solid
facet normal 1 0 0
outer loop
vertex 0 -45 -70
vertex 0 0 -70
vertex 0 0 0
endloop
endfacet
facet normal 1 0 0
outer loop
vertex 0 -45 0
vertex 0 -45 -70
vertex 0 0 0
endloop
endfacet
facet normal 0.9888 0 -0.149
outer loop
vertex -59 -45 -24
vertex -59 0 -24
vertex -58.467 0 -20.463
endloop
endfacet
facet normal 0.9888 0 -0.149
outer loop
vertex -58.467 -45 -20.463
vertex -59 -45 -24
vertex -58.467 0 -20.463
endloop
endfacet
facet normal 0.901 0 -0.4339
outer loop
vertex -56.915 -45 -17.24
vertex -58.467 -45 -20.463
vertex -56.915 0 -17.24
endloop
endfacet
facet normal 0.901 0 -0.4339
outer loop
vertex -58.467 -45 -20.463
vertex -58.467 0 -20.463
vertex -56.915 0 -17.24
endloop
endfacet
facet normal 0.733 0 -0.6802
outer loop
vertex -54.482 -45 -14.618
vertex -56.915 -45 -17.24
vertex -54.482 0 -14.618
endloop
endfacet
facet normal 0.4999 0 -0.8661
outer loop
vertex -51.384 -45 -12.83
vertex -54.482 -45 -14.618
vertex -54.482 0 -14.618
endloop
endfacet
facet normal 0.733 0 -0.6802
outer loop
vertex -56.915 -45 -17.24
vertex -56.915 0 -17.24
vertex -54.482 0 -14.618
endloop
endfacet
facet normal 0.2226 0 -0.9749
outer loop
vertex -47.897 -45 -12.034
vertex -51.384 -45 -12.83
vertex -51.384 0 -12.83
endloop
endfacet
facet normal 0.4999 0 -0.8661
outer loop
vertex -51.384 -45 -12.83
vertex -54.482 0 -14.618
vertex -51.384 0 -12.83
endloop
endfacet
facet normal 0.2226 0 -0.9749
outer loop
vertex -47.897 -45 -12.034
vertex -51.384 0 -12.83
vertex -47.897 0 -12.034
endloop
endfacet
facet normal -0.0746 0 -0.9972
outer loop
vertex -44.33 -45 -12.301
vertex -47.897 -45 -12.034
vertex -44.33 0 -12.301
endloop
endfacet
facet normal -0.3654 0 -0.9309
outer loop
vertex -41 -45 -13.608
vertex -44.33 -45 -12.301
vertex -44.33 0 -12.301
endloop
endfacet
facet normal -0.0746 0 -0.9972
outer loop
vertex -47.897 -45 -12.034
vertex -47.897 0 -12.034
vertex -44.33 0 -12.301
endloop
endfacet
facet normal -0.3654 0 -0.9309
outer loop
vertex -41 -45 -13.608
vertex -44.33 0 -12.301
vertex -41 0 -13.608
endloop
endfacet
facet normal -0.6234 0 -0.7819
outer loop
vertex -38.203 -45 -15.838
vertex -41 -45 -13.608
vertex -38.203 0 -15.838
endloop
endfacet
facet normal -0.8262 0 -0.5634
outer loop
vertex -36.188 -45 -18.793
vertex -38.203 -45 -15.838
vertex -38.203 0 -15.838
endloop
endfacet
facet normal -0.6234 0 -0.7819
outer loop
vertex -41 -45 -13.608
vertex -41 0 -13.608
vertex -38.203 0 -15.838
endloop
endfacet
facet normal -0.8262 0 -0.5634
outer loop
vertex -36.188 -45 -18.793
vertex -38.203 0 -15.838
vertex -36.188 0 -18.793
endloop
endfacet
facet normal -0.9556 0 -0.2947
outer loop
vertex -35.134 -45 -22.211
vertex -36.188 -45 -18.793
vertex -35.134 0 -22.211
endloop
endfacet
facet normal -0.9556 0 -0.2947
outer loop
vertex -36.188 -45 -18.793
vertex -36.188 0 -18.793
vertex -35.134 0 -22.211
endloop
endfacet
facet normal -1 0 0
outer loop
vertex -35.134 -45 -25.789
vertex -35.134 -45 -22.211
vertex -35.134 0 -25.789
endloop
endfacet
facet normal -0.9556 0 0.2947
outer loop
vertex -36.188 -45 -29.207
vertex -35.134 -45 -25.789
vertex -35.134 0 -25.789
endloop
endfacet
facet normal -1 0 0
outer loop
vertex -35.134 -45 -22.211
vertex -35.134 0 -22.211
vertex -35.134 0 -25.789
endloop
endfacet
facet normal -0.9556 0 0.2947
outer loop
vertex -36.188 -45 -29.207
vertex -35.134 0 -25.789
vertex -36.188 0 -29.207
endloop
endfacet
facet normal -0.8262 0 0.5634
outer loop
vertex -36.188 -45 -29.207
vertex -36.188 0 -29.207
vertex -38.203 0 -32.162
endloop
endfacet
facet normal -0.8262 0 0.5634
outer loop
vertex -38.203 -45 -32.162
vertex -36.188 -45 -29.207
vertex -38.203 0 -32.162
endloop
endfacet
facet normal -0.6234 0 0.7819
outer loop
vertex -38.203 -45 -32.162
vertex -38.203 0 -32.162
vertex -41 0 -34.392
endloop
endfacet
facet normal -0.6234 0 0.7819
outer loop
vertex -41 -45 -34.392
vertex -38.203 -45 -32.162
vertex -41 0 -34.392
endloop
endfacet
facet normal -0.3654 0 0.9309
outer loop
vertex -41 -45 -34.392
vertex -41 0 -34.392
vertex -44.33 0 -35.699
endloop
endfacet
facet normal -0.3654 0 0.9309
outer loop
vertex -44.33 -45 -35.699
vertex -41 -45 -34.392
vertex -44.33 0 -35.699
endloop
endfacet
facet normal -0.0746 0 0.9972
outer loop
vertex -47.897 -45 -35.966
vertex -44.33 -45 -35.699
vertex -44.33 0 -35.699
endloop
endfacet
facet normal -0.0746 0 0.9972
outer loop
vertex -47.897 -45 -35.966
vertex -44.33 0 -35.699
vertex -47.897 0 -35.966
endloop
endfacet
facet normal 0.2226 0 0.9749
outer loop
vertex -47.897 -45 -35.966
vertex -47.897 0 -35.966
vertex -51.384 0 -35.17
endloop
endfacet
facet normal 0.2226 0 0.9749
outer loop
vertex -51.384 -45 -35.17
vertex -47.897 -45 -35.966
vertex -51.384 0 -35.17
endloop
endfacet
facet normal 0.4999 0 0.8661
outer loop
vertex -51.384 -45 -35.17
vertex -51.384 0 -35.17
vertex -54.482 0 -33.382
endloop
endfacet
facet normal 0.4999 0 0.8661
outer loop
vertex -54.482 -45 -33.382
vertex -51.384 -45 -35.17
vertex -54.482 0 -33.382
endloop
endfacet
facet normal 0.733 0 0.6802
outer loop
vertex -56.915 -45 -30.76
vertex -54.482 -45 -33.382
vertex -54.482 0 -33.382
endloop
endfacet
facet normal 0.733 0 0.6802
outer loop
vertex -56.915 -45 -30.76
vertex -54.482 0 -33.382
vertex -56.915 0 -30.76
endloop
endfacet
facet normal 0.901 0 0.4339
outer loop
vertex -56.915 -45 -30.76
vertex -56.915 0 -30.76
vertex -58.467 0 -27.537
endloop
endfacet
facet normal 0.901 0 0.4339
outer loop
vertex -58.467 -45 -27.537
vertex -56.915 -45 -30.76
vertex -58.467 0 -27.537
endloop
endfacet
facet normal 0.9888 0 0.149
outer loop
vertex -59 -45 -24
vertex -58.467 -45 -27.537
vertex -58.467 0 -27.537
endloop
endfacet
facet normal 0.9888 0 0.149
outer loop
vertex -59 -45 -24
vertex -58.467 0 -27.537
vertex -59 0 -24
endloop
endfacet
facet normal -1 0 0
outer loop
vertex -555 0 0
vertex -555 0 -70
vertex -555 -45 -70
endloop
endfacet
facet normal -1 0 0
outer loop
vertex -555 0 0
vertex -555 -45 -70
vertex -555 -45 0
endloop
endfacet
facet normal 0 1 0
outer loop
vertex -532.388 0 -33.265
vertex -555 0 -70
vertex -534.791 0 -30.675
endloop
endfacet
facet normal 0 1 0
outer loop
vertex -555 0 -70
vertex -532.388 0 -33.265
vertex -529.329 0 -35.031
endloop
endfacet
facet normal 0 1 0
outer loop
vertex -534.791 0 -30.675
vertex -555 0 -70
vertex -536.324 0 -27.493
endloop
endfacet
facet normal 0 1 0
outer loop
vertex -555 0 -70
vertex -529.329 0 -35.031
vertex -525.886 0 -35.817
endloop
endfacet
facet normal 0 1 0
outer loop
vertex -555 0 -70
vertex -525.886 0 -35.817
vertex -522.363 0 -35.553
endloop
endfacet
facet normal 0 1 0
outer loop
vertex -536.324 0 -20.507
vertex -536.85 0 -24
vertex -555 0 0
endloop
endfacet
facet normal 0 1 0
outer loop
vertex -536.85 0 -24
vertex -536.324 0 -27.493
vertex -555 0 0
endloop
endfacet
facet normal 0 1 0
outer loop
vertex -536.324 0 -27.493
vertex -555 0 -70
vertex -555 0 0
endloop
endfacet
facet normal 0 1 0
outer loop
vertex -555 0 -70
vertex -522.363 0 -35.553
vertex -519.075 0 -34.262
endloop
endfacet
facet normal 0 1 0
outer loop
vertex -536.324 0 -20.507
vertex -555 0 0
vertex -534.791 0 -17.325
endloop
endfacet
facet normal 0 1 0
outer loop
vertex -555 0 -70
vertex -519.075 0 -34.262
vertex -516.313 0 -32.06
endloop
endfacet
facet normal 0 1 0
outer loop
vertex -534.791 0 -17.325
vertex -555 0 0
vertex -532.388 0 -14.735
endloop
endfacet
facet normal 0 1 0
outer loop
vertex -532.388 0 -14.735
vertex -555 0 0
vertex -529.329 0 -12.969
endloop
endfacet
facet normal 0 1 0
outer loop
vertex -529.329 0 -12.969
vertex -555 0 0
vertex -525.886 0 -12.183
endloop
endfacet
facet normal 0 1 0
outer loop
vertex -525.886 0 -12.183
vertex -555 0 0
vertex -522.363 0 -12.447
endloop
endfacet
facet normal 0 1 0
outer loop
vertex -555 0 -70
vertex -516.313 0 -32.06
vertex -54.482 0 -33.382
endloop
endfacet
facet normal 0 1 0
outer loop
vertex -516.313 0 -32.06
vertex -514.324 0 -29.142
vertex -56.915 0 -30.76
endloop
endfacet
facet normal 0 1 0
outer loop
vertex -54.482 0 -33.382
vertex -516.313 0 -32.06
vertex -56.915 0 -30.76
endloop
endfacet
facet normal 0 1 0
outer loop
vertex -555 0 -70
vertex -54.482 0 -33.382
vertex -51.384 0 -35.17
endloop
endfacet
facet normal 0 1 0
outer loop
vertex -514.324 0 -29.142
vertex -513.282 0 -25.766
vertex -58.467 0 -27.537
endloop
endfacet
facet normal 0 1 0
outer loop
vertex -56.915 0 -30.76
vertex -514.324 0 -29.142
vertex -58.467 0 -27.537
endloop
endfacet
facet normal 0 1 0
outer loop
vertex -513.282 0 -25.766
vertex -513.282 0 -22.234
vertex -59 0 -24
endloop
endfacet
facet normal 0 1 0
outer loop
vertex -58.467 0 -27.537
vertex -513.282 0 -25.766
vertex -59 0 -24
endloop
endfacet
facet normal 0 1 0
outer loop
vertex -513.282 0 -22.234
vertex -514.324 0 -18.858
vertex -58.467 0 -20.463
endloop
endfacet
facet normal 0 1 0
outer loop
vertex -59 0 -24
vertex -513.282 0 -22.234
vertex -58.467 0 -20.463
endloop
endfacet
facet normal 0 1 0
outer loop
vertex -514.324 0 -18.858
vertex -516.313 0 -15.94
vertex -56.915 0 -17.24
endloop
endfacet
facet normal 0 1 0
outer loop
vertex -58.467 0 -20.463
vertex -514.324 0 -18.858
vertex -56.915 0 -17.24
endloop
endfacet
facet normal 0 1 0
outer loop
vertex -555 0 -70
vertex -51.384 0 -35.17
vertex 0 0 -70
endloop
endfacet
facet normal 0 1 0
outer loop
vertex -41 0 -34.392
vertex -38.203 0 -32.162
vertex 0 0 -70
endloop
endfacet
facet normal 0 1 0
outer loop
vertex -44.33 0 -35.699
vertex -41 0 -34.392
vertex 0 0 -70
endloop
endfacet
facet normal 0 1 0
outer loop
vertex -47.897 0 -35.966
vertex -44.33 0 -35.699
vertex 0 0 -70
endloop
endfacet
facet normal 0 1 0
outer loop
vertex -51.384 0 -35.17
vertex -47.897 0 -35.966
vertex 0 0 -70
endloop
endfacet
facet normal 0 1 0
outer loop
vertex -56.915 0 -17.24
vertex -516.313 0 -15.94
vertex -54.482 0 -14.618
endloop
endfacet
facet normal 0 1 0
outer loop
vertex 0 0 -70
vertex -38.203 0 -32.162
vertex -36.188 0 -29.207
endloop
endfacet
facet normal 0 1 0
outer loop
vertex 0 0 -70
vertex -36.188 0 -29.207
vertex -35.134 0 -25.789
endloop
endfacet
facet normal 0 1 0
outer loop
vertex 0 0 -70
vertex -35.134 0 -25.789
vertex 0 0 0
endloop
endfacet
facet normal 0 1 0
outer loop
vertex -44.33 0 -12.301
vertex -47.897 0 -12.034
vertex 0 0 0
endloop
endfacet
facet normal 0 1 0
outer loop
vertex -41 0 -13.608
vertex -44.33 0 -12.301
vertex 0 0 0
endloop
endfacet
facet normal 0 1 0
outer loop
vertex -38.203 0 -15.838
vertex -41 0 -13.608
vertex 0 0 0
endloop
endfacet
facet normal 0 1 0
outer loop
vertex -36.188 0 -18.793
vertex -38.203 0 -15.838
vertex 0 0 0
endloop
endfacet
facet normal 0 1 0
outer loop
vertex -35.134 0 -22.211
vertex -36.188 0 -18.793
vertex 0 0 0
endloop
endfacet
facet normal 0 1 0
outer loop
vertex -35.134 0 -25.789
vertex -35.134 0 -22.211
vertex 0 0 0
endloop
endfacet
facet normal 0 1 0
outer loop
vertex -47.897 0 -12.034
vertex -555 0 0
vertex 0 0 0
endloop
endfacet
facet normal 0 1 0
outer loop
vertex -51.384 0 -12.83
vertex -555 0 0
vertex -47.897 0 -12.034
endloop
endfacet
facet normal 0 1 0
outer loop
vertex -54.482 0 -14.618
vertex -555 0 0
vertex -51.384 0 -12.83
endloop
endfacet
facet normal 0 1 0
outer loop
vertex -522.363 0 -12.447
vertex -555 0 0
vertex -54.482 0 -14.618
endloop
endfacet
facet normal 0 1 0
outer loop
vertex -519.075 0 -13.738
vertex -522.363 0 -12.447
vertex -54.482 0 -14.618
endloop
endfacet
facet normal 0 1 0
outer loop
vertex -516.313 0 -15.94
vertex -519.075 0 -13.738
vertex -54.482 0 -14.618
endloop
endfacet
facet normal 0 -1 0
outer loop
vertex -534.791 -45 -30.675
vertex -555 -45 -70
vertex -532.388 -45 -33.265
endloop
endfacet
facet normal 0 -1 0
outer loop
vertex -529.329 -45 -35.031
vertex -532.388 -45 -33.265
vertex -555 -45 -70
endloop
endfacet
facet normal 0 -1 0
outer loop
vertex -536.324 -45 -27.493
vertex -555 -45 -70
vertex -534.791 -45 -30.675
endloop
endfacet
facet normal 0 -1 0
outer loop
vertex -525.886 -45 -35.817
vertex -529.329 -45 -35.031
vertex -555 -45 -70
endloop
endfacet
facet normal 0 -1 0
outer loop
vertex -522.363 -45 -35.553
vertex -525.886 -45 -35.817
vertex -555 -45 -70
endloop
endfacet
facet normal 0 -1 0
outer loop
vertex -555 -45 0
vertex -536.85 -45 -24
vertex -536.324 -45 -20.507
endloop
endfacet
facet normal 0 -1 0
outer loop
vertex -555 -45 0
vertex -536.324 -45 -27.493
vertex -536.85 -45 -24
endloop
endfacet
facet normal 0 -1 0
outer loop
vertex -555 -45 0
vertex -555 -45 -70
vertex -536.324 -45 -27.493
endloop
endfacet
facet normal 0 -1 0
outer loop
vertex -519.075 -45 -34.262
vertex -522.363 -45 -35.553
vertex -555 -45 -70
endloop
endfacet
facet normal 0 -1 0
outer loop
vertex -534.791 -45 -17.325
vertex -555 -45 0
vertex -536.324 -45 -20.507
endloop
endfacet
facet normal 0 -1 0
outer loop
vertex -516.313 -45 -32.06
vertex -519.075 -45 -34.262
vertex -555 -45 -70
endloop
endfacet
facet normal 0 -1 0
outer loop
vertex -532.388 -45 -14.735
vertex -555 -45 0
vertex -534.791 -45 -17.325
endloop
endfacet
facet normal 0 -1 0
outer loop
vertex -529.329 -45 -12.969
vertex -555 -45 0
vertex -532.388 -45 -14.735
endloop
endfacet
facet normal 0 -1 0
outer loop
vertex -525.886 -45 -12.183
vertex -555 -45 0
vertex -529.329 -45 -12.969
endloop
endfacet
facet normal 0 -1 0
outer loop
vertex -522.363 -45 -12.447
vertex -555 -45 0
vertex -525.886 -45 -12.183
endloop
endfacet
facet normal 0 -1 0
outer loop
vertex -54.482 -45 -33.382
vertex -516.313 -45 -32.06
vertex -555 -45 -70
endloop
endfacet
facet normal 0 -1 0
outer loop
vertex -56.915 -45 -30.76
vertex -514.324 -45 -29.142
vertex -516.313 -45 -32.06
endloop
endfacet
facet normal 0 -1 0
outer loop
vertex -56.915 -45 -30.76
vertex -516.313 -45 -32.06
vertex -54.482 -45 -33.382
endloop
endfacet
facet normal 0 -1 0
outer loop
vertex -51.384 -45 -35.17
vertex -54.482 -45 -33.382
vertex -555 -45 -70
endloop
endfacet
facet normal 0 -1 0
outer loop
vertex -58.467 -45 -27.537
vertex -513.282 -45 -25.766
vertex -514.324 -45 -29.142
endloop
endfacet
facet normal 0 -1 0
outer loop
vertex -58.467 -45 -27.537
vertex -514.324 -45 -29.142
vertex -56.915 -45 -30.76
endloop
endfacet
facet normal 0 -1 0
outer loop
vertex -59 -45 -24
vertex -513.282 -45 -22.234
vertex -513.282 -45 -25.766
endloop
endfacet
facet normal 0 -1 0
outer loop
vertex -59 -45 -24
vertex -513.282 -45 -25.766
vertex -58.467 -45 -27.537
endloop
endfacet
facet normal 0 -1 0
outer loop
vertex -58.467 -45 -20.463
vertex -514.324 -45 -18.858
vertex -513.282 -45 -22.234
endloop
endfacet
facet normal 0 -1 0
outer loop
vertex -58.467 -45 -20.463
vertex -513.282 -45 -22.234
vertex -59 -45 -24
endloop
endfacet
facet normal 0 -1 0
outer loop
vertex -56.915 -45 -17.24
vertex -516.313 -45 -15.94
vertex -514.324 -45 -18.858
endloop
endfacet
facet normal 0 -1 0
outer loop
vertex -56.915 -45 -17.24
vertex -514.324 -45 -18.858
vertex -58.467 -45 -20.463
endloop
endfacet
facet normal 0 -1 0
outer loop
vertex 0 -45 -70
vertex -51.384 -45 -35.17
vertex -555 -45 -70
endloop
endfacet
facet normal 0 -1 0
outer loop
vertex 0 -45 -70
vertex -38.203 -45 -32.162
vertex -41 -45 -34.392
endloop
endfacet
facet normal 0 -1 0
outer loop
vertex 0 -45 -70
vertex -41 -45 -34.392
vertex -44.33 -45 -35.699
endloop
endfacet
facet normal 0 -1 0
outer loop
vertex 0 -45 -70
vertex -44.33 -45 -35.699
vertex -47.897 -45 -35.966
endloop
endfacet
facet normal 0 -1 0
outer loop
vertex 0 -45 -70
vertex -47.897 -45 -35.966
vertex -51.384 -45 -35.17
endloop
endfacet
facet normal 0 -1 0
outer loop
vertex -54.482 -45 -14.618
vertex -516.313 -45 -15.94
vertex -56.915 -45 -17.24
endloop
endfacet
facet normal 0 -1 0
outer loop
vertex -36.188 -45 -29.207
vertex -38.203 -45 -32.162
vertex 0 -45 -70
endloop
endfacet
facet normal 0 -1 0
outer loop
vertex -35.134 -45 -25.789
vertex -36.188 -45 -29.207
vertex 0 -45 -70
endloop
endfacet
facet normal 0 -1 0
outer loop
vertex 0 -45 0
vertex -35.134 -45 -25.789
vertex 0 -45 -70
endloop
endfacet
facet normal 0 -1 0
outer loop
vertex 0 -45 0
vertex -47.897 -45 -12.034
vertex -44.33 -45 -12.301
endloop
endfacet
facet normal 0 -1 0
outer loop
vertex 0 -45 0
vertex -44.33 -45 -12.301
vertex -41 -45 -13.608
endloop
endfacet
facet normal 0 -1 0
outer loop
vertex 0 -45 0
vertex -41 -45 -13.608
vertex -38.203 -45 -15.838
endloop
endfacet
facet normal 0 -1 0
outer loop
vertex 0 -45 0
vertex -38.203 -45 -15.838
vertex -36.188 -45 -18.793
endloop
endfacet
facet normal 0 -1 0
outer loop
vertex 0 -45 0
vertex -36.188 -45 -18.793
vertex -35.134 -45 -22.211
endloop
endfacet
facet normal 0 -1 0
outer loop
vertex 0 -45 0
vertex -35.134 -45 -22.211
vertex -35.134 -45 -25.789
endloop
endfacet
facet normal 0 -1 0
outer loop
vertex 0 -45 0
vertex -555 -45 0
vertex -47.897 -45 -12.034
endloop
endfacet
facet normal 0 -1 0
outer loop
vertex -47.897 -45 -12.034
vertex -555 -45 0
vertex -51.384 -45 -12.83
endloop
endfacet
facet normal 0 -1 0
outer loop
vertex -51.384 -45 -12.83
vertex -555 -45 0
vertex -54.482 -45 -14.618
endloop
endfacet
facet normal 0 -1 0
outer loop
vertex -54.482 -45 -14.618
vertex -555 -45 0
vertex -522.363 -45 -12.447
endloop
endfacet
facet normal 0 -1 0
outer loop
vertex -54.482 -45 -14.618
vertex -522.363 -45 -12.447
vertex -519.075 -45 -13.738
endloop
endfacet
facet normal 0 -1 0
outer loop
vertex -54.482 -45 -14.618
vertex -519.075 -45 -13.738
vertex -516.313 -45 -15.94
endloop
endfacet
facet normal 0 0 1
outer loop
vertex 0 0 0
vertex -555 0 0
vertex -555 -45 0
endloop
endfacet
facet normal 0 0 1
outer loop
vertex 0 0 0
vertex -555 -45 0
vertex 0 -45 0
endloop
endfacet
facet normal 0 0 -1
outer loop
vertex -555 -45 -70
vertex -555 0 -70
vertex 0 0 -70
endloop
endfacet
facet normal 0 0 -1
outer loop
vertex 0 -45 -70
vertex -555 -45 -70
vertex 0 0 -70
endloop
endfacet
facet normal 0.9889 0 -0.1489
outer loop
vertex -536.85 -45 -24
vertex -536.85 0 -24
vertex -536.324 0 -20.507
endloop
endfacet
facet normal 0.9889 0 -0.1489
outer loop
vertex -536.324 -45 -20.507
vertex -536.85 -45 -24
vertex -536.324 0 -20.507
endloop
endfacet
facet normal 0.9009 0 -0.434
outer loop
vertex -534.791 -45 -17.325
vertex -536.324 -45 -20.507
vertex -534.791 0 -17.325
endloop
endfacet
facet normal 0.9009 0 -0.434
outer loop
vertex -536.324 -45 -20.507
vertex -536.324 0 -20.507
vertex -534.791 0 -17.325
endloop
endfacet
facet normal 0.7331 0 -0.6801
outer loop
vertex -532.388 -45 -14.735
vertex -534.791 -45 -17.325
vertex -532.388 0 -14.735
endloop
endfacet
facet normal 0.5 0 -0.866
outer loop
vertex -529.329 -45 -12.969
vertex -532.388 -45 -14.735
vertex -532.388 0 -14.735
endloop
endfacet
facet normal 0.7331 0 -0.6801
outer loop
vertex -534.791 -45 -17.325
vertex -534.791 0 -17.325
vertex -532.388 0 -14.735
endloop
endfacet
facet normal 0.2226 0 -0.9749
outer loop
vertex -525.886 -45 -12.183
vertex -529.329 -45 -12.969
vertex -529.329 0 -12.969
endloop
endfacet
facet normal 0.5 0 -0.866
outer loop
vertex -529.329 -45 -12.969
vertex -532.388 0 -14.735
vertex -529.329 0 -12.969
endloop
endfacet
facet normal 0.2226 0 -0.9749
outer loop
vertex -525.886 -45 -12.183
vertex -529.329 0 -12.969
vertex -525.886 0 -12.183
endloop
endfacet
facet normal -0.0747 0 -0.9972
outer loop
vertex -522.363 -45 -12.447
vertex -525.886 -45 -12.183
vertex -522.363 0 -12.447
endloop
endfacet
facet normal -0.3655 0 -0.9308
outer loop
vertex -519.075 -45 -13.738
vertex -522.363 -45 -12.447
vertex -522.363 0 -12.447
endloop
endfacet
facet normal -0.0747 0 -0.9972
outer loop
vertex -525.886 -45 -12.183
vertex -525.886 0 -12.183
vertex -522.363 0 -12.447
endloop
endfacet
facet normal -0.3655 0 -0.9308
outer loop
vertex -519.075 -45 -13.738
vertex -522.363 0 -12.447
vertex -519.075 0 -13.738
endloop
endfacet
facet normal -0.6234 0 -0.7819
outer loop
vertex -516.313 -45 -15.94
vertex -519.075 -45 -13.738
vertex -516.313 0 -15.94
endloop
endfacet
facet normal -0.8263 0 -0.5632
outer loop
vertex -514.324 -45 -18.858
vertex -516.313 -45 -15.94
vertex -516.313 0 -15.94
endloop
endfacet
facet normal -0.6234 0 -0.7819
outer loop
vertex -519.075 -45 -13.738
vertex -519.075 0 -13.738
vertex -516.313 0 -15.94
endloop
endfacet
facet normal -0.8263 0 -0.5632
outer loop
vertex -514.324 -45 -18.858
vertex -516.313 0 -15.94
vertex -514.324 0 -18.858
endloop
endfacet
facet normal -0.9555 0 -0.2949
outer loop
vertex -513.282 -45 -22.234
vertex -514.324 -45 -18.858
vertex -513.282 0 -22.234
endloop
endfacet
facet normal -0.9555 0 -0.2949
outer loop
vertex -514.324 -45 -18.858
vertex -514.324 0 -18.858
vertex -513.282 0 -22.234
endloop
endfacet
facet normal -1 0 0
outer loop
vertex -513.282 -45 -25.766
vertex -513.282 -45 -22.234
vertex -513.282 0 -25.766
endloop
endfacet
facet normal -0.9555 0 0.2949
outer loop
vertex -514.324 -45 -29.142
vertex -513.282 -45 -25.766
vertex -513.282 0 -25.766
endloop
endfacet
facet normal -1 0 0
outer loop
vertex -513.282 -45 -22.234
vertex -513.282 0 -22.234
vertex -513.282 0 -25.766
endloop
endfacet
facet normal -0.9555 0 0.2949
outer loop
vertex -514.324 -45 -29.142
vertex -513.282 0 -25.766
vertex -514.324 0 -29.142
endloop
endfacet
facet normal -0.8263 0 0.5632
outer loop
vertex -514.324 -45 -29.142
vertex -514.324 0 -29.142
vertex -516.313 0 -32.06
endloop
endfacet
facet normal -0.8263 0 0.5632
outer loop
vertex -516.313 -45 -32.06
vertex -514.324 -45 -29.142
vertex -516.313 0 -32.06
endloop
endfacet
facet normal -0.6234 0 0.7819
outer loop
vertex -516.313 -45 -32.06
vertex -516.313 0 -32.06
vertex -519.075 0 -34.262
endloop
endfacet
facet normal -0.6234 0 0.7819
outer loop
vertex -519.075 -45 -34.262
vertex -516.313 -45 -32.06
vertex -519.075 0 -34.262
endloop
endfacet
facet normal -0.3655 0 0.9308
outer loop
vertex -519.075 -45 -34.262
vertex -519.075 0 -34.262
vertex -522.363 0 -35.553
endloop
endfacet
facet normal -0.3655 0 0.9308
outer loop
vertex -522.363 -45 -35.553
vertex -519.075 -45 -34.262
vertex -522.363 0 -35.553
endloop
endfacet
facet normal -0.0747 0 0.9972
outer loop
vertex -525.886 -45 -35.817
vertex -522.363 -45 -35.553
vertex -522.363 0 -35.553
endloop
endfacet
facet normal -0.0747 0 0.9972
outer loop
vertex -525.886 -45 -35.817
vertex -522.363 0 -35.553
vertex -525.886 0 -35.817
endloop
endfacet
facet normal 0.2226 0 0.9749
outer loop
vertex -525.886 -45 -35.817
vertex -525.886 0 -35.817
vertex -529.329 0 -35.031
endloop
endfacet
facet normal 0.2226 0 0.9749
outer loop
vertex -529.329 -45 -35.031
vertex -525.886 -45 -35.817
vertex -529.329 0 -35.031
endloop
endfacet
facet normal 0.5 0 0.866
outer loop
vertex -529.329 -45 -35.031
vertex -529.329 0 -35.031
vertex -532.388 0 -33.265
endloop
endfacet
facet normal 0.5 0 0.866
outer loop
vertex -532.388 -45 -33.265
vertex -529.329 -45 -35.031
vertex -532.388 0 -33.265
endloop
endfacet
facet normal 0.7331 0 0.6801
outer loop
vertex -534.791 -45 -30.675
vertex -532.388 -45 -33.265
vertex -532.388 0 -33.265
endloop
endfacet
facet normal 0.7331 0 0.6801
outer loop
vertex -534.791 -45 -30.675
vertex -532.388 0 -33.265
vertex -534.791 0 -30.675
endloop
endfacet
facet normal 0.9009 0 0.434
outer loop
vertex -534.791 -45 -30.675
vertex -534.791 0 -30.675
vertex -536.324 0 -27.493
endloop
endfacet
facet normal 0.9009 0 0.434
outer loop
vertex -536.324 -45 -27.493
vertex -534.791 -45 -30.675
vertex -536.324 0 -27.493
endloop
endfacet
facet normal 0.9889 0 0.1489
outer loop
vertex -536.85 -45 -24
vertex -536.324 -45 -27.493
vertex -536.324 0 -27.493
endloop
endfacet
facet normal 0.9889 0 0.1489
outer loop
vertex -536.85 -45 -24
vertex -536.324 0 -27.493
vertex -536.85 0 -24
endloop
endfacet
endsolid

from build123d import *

# Parameters (mm, degrees)
F0_W     = 555
F0_H     = 70
F1_DEPTH = 45
F2_R     = 11.85
F3_DEPTH = 45.001
F4_R     = 12
F5_DEPTH = 45.001


with BuildPart() as f1:
    # F0 (on Front) → F1 (new body)
    with BuildSketch(Plane.XZ):
        with Locations((-277.5, -35)):
            Rectangle(F0_W, F0_H)
    extrude(amount=F1_DEPTH)

    # F2 (on face) → F3 (cut, through all)
    with BuildSketch(Plane(origin=(0, 0, 0), x_dir=(-1, 0, 0), z_dir=(0, 1, 0))):
        with Locations((525, -24)):
            Circle(F2_R)
    extrude(amount=-F3_DEPTH, mode=Mode.SUBTRACT)

    # F4 (on face) → F5 (cut, through all)
    with BuildSketch(Plane(origin=(0, 0, 0), x_dir=(-1, 0, 0), z_dir=(0, 1, 0))):
        with Locations((47, -24)):
            Circle(F4_R)
    extrude(amount=-F5_DEPTH, mode=Mode.SUBTRACT)


solid = f1.part
